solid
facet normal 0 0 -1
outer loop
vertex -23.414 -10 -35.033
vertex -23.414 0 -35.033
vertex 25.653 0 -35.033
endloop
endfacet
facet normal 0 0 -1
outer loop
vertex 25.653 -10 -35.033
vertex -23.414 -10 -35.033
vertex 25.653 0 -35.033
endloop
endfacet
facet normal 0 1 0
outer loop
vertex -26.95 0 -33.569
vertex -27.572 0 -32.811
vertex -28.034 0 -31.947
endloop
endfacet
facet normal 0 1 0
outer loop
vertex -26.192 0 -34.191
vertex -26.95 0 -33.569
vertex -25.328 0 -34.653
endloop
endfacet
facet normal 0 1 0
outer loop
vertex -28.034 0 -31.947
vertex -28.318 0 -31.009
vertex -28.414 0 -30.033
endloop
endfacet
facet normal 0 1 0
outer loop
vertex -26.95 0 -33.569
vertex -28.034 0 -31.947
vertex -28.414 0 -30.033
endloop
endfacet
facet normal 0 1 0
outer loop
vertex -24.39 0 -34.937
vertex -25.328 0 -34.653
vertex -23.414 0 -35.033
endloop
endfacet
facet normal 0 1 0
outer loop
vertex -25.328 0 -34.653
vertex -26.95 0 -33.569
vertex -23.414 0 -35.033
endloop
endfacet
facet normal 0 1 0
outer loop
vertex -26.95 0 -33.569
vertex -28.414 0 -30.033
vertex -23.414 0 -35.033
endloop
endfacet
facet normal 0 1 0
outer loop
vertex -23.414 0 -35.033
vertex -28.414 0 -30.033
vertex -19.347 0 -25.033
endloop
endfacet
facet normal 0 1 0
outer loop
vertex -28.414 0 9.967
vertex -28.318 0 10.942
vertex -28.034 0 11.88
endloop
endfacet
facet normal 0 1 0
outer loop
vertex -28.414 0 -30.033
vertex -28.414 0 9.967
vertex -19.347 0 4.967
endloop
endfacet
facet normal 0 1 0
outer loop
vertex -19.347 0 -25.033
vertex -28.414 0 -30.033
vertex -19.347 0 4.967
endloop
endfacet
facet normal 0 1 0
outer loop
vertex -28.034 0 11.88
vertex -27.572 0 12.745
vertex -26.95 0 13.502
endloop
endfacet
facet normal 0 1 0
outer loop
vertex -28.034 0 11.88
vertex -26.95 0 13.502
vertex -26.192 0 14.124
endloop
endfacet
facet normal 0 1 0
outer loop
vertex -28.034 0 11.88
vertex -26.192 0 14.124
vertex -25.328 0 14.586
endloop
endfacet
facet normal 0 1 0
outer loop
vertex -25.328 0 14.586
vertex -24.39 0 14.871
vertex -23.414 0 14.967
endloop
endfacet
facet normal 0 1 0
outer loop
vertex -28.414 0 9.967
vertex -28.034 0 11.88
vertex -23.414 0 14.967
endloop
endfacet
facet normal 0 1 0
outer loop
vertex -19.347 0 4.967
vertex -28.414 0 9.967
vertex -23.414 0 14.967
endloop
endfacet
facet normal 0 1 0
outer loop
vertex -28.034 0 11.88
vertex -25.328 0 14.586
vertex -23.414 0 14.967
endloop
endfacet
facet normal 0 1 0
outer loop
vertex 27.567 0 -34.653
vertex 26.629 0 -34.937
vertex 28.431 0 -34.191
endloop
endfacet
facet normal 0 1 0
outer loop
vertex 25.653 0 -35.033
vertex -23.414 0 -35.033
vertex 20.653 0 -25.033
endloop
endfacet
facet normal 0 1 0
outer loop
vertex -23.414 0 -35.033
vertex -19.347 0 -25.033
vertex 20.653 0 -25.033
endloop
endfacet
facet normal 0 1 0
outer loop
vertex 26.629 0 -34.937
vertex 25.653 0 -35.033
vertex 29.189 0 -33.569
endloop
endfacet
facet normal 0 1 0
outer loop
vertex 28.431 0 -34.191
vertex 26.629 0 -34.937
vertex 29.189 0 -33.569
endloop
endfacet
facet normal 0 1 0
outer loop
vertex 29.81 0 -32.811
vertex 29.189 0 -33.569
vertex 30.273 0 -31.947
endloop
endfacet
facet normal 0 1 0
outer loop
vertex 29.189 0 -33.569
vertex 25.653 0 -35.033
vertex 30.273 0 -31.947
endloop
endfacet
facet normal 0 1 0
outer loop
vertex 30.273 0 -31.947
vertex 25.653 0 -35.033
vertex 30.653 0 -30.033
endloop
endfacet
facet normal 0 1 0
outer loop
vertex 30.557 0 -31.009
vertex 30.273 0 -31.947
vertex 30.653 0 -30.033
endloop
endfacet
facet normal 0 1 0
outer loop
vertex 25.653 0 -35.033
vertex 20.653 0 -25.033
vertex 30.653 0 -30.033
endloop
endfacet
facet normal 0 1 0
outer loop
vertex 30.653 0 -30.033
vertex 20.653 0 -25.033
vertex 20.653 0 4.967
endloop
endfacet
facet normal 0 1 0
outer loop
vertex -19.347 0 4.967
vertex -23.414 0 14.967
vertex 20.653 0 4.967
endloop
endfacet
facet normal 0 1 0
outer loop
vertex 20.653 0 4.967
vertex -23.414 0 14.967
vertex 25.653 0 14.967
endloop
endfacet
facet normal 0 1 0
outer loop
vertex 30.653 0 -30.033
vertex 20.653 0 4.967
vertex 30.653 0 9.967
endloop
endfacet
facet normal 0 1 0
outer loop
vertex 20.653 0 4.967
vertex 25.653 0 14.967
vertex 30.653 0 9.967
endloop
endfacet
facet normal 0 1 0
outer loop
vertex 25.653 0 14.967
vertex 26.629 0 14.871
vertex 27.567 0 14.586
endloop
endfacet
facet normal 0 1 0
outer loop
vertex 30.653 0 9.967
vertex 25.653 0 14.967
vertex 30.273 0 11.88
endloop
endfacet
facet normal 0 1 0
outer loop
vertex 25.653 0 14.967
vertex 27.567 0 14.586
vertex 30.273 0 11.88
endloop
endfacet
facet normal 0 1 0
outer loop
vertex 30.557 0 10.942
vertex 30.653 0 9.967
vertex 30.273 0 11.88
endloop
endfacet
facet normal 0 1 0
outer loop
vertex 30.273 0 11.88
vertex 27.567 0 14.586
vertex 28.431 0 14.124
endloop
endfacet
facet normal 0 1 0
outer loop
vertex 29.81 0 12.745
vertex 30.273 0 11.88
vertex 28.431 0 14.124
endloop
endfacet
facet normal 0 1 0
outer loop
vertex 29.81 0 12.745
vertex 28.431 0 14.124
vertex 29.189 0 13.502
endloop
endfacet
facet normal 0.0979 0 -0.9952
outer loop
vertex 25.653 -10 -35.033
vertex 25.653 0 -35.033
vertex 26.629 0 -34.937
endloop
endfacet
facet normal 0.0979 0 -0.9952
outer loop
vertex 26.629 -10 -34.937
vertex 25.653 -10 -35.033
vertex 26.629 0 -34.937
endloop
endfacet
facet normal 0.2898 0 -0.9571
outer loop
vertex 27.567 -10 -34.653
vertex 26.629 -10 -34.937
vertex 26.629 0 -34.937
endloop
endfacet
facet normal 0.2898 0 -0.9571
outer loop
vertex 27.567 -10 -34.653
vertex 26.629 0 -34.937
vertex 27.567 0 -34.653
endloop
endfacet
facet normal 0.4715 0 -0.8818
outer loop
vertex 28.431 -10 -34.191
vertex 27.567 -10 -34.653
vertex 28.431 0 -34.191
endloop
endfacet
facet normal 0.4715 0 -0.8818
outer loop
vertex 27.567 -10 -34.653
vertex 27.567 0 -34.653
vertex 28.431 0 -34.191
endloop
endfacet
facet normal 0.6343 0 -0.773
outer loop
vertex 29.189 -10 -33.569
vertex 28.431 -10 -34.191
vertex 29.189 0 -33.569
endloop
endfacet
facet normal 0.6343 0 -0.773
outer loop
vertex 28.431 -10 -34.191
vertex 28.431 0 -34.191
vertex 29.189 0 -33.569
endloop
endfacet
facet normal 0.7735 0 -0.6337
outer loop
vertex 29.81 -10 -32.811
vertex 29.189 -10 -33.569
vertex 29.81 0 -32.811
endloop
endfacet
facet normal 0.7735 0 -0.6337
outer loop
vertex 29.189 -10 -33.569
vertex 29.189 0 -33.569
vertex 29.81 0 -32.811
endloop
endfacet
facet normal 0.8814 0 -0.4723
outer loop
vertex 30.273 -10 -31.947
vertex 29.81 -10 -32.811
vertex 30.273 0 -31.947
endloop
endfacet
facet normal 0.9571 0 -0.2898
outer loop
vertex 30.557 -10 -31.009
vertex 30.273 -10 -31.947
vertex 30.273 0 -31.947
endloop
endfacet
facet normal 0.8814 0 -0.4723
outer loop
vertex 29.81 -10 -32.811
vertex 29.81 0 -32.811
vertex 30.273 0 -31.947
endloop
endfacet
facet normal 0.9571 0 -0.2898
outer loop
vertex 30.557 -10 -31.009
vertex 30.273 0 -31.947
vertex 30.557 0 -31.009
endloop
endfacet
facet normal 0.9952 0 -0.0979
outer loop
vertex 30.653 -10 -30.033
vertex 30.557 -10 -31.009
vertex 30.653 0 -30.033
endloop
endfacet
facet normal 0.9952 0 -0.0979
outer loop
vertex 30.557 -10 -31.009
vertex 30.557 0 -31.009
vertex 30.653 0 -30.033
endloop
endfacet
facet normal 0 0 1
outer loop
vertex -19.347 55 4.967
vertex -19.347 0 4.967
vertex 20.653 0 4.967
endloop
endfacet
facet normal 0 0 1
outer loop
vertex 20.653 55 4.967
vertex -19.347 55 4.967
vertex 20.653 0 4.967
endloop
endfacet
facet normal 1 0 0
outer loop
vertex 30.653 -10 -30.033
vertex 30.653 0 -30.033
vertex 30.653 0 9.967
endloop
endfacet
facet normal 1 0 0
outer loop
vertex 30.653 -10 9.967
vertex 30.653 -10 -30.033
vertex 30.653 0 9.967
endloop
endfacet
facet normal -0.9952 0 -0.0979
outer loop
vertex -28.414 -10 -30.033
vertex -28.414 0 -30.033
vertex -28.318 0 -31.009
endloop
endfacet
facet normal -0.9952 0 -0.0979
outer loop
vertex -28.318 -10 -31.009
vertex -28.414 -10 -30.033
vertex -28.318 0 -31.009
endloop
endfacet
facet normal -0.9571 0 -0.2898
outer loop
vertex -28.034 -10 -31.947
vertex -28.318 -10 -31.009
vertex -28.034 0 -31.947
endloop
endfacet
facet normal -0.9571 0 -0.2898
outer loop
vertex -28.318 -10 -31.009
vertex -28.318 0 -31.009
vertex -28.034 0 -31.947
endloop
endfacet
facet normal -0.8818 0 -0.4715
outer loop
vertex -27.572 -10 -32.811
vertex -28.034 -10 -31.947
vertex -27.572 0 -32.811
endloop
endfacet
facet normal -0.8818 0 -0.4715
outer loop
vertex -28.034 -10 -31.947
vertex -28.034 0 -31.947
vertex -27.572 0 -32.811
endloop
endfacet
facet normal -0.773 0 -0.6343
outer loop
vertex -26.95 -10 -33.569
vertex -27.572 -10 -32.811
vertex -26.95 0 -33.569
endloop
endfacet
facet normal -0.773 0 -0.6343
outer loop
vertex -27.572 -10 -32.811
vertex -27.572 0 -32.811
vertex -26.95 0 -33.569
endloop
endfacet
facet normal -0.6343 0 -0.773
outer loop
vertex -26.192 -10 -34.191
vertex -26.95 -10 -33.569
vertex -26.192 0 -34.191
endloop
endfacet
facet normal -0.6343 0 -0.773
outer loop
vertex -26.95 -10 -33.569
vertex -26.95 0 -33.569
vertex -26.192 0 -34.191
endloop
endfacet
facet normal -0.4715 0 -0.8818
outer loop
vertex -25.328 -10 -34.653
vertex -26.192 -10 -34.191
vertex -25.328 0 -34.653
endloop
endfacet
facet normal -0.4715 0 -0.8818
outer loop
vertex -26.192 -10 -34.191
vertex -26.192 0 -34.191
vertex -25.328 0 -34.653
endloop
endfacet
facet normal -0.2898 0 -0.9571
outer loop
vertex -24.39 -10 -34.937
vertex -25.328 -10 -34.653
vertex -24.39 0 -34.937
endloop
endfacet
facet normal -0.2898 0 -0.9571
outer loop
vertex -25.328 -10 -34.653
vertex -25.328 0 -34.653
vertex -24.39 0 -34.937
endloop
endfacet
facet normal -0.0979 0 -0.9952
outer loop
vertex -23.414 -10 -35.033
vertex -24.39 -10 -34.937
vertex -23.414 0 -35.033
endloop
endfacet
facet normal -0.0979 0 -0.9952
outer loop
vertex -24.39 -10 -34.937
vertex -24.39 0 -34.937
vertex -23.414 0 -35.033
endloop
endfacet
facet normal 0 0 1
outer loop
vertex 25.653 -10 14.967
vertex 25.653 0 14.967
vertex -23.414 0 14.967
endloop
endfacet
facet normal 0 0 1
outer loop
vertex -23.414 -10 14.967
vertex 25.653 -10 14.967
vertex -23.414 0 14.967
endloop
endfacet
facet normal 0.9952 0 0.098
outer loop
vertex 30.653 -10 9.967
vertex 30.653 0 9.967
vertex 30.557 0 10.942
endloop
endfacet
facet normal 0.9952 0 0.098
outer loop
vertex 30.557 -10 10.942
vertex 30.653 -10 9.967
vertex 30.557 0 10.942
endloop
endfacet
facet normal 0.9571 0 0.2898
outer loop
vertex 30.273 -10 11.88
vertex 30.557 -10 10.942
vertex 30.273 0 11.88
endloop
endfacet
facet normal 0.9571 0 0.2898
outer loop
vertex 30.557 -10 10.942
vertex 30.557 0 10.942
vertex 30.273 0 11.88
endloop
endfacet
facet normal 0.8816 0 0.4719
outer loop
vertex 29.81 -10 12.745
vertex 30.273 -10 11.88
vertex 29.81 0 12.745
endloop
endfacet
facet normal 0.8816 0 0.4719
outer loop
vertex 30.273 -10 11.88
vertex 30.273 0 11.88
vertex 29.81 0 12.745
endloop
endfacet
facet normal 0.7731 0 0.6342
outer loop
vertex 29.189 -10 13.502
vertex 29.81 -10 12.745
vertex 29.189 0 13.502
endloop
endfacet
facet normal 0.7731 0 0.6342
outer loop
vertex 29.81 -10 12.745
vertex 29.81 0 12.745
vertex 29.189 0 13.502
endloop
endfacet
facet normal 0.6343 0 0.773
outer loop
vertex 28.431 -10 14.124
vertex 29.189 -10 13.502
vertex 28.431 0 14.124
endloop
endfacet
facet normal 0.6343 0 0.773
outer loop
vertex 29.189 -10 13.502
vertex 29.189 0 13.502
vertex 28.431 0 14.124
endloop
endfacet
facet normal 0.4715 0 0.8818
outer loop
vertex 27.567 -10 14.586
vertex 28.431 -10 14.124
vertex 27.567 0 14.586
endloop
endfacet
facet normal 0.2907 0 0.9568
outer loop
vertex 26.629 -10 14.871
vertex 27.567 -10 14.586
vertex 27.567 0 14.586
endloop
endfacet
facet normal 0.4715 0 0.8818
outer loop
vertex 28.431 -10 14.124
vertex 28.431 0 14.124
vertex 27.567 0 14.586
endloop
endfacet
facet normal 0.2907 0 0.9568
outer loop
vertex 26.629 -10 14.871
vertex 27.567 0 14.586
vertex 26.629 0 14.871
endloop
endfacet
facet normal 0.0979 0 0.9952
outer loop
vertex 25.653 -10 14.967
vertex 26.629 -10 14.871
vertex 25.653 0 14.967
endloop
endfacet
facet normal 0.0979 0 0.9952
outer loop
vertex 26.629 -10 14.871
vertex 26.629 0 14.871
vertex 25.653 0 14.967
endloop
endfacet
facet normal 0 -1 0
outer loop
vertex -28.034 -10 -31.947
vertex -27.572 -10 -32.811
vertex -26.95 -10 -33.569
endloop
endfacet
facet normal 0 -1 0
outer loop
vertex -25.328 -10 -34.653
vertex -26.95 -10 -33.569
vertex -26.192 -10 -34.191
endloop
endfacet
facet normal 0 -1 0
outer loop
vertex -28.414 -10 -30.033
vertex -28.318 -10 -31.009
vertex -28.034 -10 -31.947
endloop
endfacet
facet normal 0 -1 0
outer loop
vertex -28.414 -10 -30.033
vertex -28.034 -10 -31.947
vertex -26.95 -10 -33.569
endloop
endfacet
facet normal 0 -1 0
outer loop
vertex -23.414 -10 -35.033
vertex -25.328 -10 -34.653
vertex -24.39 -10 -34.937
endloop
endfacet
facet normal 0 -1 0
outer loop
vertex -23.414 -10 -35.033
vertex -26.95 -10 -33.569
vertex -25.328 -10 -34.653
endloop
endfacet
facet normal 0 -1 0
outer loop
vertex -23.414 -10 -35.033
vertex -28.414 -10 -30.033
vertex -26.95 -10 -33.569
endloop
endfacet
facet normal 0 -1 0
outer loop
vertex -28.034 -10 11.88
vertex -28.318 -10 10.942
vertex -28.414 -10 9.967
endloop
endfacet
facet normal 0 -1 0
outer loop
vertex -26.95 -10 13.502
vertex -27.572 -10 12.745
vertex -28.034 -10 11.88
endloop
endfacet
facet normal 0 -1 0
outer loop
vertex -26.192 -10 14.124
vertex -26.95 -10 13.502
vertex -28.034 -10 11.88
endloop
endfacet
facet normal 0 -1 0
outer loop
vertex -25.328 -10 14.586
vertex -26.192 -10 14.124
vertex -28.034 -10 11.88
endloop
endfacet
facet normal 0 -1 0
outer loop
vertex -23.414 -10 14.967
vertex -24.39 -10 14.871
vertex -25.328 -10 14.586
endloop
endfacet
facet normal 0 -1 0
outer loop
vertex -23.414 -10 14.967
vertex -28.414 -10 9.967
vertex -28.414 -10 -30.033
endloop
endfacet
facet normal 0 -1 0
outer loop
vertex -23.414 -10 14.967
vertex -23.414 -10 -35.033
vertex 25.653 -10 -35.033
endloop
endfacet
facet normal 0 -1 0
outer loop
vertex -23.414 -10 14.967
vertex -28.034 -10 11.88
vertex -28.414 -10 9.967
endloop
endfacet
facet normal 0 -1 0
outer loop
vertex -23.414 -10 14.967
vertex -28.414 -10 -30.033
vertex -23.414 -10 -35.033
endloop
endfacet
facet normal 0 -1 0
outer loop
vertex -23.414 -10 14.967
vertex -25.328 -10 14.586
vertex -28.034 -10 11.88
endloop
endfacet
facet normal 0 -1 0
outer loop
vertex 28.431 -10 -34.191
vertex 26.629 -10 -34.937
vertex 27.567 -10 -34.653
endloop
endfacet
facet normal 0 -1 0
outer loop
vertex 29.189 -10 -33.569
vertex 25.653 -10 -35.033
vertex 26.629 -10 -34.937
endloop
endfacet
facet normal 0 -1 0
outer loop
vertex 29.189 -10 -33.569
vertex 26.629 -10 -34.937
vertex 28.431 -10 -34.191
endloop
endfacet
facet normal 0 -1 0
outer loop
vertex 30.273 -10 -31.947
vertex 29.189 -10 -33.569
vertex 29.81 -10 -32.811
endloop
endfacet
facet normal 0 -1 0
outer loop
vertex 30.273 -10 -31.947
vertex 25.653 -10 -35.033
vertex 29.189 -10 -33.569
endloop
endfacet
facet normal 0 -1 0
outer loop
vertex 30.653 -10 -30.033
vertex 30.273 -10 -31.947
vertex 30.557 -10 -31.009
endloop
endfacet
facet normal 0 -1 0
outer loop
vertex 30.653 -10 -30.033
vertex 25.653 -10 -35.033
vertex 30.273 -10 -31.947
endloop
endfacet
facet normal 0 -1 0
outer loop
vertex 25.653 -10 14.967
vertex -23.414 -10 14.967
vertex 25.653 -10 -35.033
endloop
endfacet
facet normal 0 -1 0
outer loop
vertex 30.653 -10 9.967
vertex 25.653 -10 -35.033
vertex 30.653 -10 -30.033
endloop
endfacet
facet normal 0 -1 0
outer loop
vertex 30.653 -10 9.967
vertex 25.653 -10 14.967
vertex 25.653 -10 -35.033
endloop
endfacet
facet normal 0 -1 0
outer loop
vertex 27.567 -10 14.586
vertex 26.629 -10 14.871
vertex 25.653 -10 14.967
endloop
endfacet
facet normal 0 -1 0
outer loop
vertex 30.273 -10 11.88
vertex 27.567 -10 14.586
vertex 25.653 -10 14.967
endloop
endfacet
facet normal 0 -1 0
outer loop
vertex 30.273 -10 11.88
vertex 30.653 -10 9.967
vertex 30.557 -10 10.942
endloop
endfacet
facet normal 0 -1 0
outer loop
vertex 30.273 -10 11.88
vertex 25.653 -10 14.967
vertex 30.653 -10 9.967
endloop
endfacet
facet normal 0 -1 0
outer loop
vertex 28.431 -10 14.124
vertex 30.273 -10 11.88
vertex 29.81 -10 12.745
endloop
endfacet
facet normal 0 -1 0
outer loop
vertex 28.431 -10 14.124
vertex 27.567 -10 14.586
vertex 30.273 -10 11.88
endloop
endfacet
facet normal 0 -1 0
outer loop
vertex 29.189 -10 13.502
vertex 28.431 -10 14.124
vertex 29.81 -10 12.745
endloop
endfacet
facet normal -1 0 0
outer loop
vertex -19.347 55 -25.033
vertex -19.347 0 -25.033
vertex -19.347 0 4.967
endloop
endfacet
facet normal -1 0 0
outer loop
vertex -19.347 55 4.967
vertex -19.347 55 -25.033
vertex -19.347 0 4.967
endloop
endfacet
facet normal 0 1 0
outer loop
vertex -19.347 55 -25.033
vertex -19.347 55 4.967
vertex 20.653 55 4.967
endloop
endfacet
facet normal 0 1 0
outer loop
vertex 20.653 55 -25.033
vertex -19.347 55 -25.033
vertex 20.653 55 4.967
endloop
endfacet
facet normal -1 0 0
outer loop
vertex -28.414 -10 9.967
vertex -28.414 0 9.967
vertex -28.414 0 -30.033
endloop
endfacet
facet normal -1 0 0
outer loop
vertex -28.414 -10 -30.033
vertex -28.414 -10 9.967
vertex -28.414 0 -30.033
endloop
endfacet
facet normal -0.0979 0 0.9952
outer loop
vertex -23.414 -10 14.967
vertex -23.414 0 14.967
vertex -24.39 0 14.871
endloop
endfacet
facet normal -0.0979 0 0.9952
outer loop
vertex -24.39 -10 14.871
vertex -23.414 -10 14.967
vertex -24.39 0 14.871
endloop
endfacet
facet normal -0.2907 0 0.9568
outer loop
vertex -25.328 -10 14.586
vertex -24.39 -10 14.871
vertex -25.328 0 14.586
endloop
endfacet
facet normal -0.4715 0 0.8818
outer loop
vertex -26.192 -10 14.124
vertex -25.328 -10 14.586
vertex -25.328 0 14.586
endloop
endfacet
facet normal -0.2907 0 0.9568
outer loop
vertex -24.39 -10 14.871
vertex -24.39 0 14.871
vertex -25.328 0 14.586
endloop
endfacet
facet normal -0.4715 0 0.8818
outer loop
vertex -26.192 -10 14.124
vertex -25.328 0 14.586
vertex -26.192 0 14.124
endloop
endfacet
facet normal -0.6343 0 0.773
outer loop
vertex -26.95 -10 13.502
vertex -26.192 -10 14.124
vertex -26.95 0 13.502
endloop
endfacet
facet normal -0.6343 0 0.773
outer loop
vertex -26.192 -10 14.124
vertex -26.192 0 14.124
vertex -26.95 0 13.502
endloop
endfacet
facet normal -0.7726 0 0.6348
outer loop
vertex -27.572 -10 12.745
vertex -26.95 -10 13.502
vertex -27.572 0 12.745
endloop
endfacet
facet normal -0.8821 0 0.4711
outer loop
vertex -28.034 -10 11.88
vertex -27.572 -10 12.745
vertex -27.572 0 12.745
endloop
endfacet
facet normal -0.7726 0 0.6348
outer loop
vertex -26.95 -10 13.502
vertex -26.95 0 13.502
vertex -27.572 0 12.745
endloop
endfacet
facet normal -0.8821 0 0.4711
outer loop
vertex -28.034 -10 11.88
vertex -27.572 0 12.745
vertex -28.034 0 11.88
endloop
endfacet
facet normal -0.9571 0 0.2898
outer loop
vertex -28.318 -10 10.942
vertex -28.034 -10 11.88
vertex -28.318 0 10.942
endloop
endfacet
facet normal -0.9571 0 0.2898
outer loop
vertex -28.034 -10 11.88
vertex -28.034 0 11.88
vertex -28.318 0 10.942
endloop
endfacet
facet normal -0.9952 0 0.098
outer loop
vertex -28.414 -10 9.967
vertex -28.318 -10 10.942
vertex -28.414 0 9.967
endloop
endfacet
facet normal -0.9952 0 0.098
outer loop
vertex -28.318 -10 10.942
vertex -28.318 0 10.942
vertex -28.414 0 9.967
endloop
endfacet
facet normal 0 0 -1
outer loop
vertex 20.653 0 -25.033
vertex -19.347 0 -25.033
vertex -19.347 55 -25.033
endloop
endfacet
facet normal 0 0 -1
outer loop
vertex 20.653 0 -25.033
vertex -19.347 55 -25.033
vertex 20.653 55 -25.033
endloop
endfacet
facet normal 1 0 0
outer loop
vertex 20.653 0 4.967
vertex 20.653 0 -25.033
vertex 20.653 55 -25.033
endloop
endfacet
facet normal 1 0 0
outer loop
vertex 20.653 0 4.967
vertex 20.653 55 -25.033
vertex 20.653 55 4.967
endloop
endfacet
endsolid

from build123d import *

# Parameters (mm, degrees)
F1_DEPTH = 10
F2_W     = 40
F2_H     = 30
F3_DEPTH = 55


with BuildPart() as f1:
    # F0 (on Front) → F1 (new body)
    with BuildSketch(Plane.XZ):
        with BuildLine():
            Line((25.653138, 14.966757), (-23.414218, 14.966757))
            ThreePointArc((-23.414218, 14.966757), (-26.949752, 13.502291), (-28.414218, 9.966757))
            Line((-28.414218, 9.966757), (-28.414218, -30.033243))
            ThreePointArc((-28.414218, -30.033243), (-26.949752, -33.568777), (-23.414218, -35.033243))
            Line((-23.414218, -35.033243), (25.653138, -35.033243))
            ThreePointArc((25.653138, -35.033243), (29.188672, -33.568777), (30.653138, -30.033243))
            Line((30.653138, -30.033243), (30.653138, 9.966757))
            ThreePointArc((30.653138, 9.966757), (29.188672, 13.502291), (25.653138, 14.966757))
        make_face()
    extrude(amount=F1_DEPTH)

    # F2 (on Front) → F3 (join)
    with BuildSketch(Plane.XZ):
        with Locations((0.653138, -10.033243)):
            Rectangle(F2_W, F2_H)
    extrude(amount=-F3_DEPTH)


solid = f1.part
